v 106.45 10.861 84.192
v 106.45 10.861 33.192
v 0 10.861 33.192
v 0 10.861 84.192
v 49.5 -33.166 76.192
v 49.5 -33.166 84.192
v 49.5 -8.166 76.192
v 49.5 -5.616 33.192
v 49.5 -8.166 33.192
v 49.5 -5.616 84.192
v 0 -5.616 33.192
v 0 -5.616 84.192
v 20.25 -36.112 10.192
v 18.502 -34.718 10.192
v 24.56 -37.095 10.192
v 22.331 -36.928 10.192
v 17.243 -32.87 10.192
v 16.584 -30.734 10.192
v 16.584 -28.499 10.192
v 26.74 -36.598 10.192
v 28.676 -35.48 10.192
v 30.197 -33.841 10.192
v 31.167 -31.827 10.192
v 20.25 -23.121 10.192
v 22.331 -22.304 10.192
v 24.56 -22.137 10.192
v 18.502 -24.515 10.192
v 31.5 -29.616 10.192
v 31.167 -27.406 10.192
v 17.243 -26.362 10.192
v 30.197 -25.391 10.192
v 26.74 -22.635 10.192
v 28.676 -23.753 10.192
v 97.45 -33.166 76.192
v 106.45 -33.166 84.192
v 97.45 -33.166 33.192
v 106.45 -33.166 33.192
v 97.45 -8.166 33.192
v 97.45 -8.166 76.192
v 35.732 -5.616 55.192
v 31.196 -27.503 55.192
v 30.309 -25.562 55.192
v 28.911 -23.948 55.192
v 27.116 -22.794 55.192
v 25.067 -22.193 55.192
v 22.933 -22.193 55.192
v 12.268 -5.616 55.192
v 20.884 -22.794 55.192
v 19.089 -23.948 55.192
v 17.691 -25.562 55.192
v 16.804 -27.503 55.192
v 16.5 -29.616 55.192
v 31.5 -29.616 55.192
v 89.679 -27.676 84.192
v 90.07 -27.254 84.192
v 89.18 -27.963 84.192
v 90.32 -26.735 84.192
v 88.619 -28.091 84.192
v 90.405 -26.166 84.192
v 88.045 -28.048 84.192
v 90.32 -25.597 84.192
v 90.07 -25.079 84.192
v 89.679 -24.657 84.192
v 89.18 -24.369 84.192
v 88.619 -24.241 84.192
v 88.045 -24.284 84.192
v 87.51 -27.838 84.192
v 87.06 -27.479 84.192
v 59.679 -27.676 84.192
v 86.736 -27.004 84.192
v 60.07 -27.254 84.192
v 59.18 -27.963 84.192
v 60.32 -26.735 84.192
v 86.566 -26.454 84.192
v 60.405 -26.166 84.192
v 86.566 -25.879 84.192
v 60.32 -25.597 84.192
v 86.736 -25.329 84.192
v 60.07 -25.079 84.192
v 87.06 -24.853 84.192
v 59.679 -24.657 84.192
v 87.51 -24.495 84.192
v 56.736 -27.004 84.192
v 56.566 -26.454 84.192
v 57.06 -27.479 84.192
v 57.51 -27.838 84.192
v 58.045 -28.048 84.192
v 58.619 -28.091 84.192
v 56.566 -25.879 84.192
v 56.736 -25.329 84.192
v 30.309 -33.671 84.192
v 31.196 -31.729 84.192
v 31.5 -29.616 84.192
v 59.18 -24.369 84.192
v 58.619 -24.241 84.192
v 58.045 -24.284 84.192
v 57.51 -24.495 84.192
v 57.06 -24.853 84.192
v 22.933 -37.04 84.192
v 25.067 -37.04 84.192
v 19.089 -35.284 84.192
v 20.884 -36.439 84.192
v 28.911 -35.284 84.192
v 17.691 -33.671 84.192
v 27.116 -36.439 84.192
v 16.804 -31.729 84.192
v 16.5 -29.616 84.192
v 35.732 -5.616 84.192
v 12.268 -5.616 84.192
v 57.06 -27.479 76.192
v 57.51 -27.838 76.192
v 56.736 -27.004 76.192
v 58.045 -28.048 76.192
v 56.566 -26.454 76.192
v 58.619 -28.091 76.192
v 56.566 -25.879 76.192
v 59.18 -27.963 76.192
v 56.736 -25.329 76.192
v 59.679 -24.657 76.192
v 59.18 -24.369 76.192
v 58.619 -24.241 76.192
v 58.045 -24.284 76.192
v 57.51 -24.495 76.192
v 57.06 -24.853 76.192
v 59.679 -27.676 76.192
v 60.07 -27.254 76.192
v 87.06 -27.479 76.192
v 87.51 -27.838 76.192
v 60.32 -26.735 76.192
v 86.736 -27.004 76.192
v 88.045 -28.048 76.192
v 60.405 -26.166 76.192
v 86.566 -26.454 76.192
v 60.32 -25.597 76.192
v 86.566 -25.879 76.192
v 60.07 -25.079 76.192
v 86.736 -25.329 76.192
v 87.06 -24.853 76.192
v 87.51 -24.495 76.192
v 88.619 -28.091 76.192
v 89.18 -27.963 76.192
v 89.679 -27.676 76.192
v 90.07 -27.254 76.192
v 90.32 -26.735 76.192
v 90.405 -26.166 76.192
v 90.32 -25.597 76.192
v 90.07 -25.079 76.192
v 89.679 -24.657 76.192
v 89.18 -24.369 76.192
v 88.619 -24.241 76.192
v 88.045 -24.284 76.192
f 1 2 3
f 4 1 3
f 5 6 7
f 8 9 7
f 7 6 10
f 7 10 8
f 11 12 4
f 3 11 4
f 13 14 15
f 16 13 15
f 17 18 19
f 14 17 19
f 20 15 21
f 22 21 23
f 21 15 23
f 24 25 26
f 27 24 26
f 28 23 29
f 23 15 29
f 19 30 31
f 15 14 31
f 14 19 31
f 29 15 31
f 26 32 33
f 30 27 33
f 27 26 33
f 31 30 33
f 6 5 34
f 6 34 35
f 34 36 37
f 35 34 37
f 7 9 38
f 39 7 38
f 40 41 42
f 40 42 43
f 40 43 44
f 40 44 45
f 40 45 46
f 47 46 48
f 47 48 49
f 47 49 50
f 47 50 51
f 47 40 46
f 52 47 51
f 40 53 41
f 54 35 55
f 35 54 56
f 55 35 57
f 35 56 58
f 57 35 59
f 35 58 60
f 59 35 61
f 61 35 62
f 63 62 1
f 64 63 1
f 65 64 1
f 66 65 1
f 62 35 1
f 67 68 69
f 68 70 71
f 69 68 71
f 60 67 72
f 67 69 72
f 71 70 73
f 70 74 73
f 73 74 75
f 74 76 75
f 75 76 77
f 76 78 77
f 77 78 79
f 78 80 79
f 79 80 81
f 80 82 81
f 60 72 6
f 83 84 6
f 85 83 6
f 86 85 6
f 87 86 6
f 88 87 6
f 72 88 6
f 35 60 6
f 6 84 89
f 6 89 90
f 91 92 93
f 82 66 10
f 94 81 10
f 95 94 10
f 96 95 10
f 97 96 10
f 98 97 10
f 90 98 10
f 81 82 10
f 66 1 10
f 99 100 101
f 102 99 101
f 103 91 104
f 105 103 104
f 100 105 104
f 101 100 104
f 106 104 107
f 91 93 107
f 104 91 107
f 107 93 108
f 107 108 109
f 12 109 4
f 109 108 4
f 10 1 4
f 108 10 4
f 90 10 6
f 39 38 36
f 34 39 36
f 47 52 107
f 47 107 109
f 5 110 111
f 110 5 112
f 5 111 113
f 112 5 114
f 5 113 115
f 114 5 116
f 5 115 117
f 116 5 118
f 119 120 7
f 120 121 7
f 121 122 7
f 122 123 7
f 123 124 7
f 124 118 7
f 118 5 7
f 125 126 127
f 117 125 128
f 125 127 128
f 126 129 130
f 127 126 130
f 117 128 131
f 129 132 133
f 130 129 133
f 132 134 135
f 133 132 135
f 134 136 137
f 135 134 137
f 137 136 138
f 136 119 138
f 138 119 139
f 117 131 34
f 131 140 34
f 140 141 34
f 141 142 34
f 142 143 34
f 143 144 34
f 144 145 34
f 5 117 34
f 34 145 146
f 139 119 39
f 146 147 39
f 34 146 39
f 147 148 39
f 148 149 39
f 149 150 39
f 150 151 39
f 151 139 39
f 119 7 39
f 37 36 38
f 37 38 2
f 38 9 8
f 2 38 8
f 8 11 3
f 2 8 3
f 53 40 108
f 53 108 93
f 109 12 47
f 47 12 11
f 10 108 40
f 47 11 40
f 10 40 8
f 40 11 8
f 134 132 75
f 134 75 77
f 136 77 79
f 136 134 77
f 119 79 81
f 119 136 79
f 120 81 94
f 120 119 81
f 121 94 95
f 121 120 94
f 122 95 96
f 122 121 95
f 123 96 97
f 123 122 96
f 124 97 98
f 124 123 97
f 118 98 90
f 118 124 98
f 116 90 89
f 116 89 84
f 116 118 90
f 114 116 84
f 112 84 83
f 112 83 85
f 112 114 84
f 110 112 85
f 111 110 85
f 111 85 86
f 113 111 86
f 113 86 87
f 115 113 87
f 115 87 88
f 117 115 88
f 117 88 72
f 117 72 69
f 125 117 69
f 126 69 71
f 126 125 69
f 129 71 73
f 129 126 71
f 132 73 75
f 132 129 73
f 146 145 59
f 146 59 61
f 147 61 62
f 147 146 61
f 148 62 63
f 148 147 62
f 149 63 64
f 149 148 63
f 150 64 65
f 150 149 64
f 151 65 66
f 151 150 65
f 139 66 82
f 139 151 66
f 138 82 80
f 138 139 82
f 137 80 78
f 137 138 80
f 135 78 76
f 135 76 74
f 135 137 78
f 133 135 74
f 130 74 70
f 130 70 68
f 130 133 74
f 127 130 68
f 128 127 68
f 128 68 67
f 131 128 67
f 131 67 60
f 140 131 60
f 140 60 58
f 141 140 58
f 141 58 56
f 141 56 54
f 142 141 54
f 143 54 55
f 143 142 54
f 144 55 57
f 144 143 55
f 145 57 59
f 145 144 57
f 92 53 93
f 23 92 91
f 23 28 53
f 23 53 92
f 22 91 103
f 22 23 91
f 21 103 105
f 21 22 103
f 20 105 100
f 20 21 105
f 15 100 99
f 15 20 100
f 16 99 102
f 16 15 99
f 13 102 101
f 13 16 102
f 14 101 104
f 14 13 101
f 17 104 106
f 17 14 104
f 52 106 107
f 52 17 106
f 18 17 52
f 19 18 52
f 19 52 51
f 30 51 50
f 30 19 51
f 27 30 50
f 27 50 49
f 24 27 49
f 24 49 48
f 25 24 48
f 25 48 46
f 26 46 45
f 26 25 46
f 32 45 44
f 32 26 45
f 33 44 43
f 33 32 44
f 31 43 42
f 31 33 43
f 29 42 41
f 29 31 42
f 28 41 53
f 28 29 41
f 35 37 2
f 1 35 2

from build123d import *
from build123d.topology import SkipClean

# Parameters (mm, degrees)
SKETCH1_W             = 48
SKETCH1_H             = 53
BOSS_EXTRUDE1_DEPTH   = 10
SKETCH2_W             = 48
SKETCH2_H             = 5.616325
BOSS_EXTRUDE2_DEPTH   = 33.1917878
SKETCH4_W             = 4
SKETCH4_H             = 10
BOSS_EXTRUDE4_DEPTH   = 40
SKETCH5_W             = 48
SKETCH5_H             = 10.8609375
BOSS_EXTRUDE5_DEPTH   = 23.1917878
SKETCH6_W             = 48
SKETCH6_H             = 5
BOSS_EXTRUDE6_DEPTH   = 42.3
SKETCH7_W             = 12.8082122
SKETCH7_H             = 16.4772625
BOSS_EXTRUDE7_DEPTH   = 48
CUT_EXTRUDE1_REACH    = 84.426
SKETCH8_R             = 11.5
SKETCH8_R_2           = 2
FILLET1_R             = 10
FILLET2_R             = 4
SKETCH9_W             = 5
SKETCH9_H             = 16.4772625
BOSS_EXTRUDE9_DEPTH   = 48
CUT_EXTRUDE2_DEPTH    = 88.252507127
SKETCH11_W            = 51
SKETCH11_H            = 16.4772625
BOSS_EXTRUDE10_DEPTH  = 49.45
BOSS_EXTRUDE11_DEPTH  = 46
SKETCH16_W            = 47.95
SKETCH16_H            = 51
BOSS_EXTRUDE14_DEPTH  = 2.55
SKETCH14_W            = 5
SKETCH14_H            = 42.3
BOSS_EXTRUDE13_DEPTH  = 1.5
SKETCH17_W            = 51
SKETCH17_H            = 19.0272625
BOSS_EXTRUDE15_DEPTH  = 9
BOSS_EXTRUDE16_DEPTH  = 25
SKETCH19_R            = 1.9304
CUT_EXTRUDE3_DEPTH    = 125.404890183
MIRROR2_START         = 33.1917878
MIRROR2_DEPTH         = 51
MIRROR2_START_2       = 76.1917878
MIRROR2_2_OUTLINE_W   = 47.95
MIRROR2_2_OUTLINE_H   = 25
MIRROR2_2_OUTLINE_R   = 1.9304
MIRROR2_2_DEPTH       = 8
MIRROR2_3_OUTLINE_W   = 45
MIRROR2_3_OUTLINE_H   = 42.3
MIRROR2_3_OUTLINE_R   = 2
MIRROR2_3_OUTLINE_R_2 = 11.5
MIRROR2_3_DEPTH       = 5
SKETCH20_W            = 103.287975037
SKETCH20_H            = 97.84889924
CUT_EXTRUDE4_DEPTH    = 144.929961559
SKETCH21_W            = 49.5
SKETCH21_H            = 42.3
CUT_EXTRUDE5_DEPTH    = 128.391431036
SKETCH24_R            = 7.5
BOSS_EXTRUDE18_DEPTH  = 45
BOSS_EXTRUDE19_DEPTH  = 29


# Read off the part's stored shape, not the designer's step: Mirror2
with BuildPart() as part:
    # Sketch1 → Boss-Extrude1 (new body)
    with BuildSketch(Plane.XY):
        with Locations((24, 26.5)):
            Rectangle(SKETCH1_W, SKETCH1_H)
    extrude(amount=BOSS_EXTRUDE1_DEPTH)

    # Sketch2 → Boss-Extrude2 (add)
    with BuildSketch(Plane(origin=(0, 0, 0), x_dir=(-1, 0, 0), z_dir=(0, 0, -1))):
        with Locations((-24, -2.8081625)):
            Rectangle(SKETCH2_W, SKETCH2_H)
    extrude(amount=-BOSS_EXTRUDE2_DEPTH)

    # Sketch4 → Boss-Extrude4 (add)
    with BuildSketch(Plane.XY.offset(10)):
        with Locations((2, 48)):
            Rectangle(SKETCH4_W, SKETCH4_H)
        with Locations((46, 48)):
            Rectangle(SKETCH4_W, SKETCH4_H)
    extrude(amount=BOSS_EXTRUDE4_DEPTH)

    # Sketch5 → Boss-Extrude5 (add)
    with BuildSketch(Plane.XY.offset(10)):
        with Locations((24, 5.43046875)):
            Rectangle(SKETCH5_W, SKETCH5_H)
    extrude(amount=BOSS_EXTRUDE5_DEPTH)

    # Sketch6 → Boss-Extrude6 (add)
    with BuildSketch(Plane.XZ.offset(5.616325)):
        with Locations((24, 30.6917878)):
            Rectangle(SKETCH6_W, SKETCH6_H)
    extrude(amount=BOSS_EXTRUDE6_DEPTH)

    # Sketch7 → Boss-Extrude7 (add)
    with BuildSketch(Plane.ZY):
        with Locations((-6.4041061, 2.62230625)):
            Rectangle(SKETCH7_W, SKETCH7_H)
    extrude(amount=-BOSS_EXTRUDE7_DEPTH)

    # Sketch8 → Cut-Extrude1 (cut, up to next)
    with BuildSketch(Plane(origin=(0, 0, 28.1917878), x_dir=(-1, 0, 0), z_dir=(0, 0, -1)), mode=Mode.PRIVATE) as cut_extrude1_sk1:
        with Locations((-24, -26.616325)):
            Circle(SKETCH8_R)
    cut_extrude1_tool1 = extrude(cut_extrude1_sk1.sketch, amount=-CUT_EXTRUDE1_REACH, mode=Mode.PRIVATE) & part.part
    # Sketch8 → Cut-Extrude1 (cut, up to next)
    with BuildSketch(Plane(origin=(0, 0, 28.1917878), x_dir=(-1, 0, 0), z_dir=(0, 0, -1)), mode=Mode.PRIVATE) as cut_extrude1_sk2:
        with Locations((-39.5, -11.116325)):
            Circle(SKETCH8_R_2)
    cut_extrude1_tool2 = extrude(cut_extrude1_sk2.sketch, amount=-CUT_EXTRUDE1_REACH, mode=Mode.PRIVATE) & part.part
    # Sketch8 → Cut-Extrude1 (cut, up to next)
    with BuildSketch(Plane(origin=(0, 0, 28.1917878), x_dir=(-1, 0, 0), z_dir=(0, 0, -1)), mode=Mode.PRIVATE) as cut_extrude1_sk3:
        with Locations((-39.5, -42.116325)):
            Circle(SKETCH8_R_2)
    cut_extrude1_tool3 = extrude(cut_extrude1_sk3.sketch, amount=-CUT_EXTRUDE1_REACH, mode=Mode.PRIVATE) & part.part
    # Sketch8 → Cut-Extrude1 (cut, up to next)
    with BuildSketch(Plane(origin=(0, 0, 28.1917878), x_dir=(-1, 0, 0), z_dir=(0, 0, -1)), mode=Mode.PRIVATE) as cut_extrude1_sk4:
        with Locations((-8.5, -11.116325)):
            Circle(SKETCH8_R_2)
    cut_extrude1_tool4 = extrude(cut_extrude1_sk4.sketch, amount=-CUT_EXTRUDE1_REACH, mode=Mode.PRIVATE) & part.part
    # Sketch8 → Cut-Extrude1 (cut, up to next)
    with BuildSketch(Plane(origin=(0, 0, 28.1917878), x_dir=(-1, 0, 0), z_dir=(0, 0, -1)), mode=Mode.PRIVATE) as cut_extrude1_sk5:
        with Locations((-8.5, -42.116325)):
            Circle(SKETCH8_R_2)
    cut_extrude1_tool5 = extrude(cut_extrude1_sk5.sketch, amount=-CUT_EXTRUDE1_REACH, mode=Mode.PRIVATE) & part.part
    add(cut_extrude1_tool1.solids().sort_by_distance((24, -26.616325, 28.191788))[0], mode=Mode.SUBTRACT)
    add(cut_extrude1_tool2.solids().sort_by_distance((39.5, -11.116325, 28.191788))[0], mode=Mode.SUBTRACT)
    add(cut_extrude1_tool3.solids().sort_by_distance((39.5, -42.116325, 28.191788))[0], mode=Mode.SUBTRACT)
    add(cut_extrude1_tool4.solids().sort_by_distance((8.5, -11.116325, 28.191788))[0], mode=Mode.SUBTRACT)
    add(cut_extrude1_tool5.solids().sort_by_distance((8.5, -42.116325, 28.191788))[0], mode=Mode.SUBTRACT)

    # Fillet1
    fillet1_edges = [part.edges().sort_by_distance(p)[0] for p in [
        (24, 10.8609375, 0),
    ]]
    fillet(fillet1_edges, radius=FILLET1_R)

    # Fillet2
    fillet2_edges = [part.edges().sort_by_distance(p)[0] for p in [
        (2, 43, 10),
        (46, 43, 10),
    ]]
    fillet(fillet2_edges, radius=FILLET2_R)

    # Sketch9 → Boss-Extrude9 (add)
    with BuildSketch(Plane(origin=(48, 0, 0), x_dir=(0, 0, -1), z_dir=(1, 0, 0))):
        with Locations((15.3082122, 2.62230625)):
            Rectangle(SKETCH9_W, SKETCH9_H)
    extrude(amount=-BOSS_EXTRUDE9_DEPTH)

    # Sketch10 → Cut-Extrude2 (cut, through all)
    with BuildSketch(Plane(origin=(48, 0, 0), x_dir=(0, 0, -1), z_dir=(1, 0, 0))):
        Polygon((17.8082122, 10.8609375), (-33.1917878, 10.8609375), (-76.887145623, 43.902095521), (-50.794096938, 74.436514195), (27.207463492, 71.105486703), align=None)
    extrude(amount=-CUT_EXTRUDE2_DEPTH, mode=Mode.SUBTRACT)

    # Sketch11 → Boss-Extrude10 (add)
    with BuildSketch(Plane(origin=(48, 0, 0), x_dir=(0, 0, -1), z_dir=(1, 0, 0))):
        with Locations((-7.6917878, 2.62230625)):
            Rectangle(SKETCH11_W, SKETCH11_H)
    extrude(amount=BOSS_EXTRUDE10_DEPTH)

    # Sketch12 → Boss-Extrude11 (add)
    with BuildSketch(Plane(origin=(0, 0, 28.1917878), x_dir=(-1, 0, 0), z_dir=(0, 0, -1))):
        Polygon((-48, -47.916325), (-45, -47.916325), (-45, -5.616325), (-49.5, -5.616325), (-49.5, -47.916325), align=None)
    extrude(amount=BOSS_EXTRUDE11_DEPTH)

    # Sketch16 → Boss-Extrude14 (add)
    with BuildSketch(Plane.XZ.offset(5.616325)):
        with Locations((73.475, 7.6917878)):
            Rectangle(SKETCH16_W, SKETCH16_H)
    extrude(amount=BOSS_EXTRUDE14_DEPTH)

    # Sketch14 → Boss-Extrude13 (add)
    with BuildSketch(Plane(origin=(49.5, 0, 0), x_dir=(0, 0, -1), z_dir=(1, 0, 0))):
        with Locations((-30.6917878, -26.766325)):
            Rectangle(SKETCH14_W, SKETCH14_H)
    extrude(amount=-BOSS_EXTRUDE13_DEPTH)

    # Sketch17 → Boss-Extrude15 (add)
    with BuildSketch(Plane(origin=(97.45, 0, 0), x_dir=(0, 0, -1), z_dir=(1, 0, 0))):
        with Locations((-7.6917878, 1.34730625)):
            Rectangle(SKETCH17_W, SKETCH17_H)
    extrude(amount=BOSS_EXTRUDE15_DEPTH)

    # Sketch18 → Boss-Extrude16 (add)
    with BuildSketch(Plane.XZ.offset(8.166325)):
        Polygon((49.5, -17.8082122), (106.45, -17.8082122), (106.45, -9.8082122), (106.45, 33.1917878), (97.45, 33.1917878), (97.45, -9.8082122), (49.5, -9.8082122), align=None)
    extrude(amount=BOSS_EXTRUDE16_DEPTH)

    # Sketch19 → Cut-Extrude3 (cut, through all)
    with BuildSketch(Plane.XY.offset(-9.8082122)):
        with Locations((58.475, -26.166325)):
            Circle(SKETCH19_R)
        with Locations((88.475, -26.166325)):
            Circle(SKETCH19_R)
    extrude(amount=-CUT_EXTRUDE3_DEPTH, mode=Mode.SUBTRACT)

    # Mirror2 outline → Mirror2 (add)
    with BuildSketch(Plane.XY.offset(MIRROR2_START)):
        Polygon((49.5, -47.916325), (49.5, -8.166325), (97.45, -8.166325), (97.45, -33.166325), (106.45, -33.166325), (106.45, 10.8609375), (0, 10.8609375), (0, -5.616325), (45, -5.616325), (45, -47.916325), align=None)
    extrude(amount=MIRROR2_DEPTH)

    # Mirror2 2 outline → Mirror2 2 (add)
    with BuildSketch(Plane.XY.offset(MIRROR2_START_2)):
        with Locations((73.475, -20.666325)):
            Rectangle(MIRROR2_2_OUTLINE_W, MIRROR2_2_OUTLINE_H)
        with Locations((58.475, -26.166325)):
            Circle(MIRROR2_2_OUTLINE_R, mode=Mode.SUBTRACT)
        with Locations((88.475, -26.166325)):
            Circle(MIRROR2_2_OUTLINE_R, mode=Mode.SUBTRACT)
    extrude(amount=MIRROR2_2_DEPTH)

    # Mirror2 3 outline → Mirror2 3 (add)
    with SkipClean():  # the faces are left unmerged after this step: merging them gives an invalid solid
        with BuildSketch(Plane.XY.offset(MIRROR2_START)):
            with Locations((22.5, -26.766325)):
                Rectangle(MIRROR2_3_OUTLINE_W, MIRROR2_3_OUTLINE_H)
            with Locations((8.5, -42.116325)):
                Circle(MIRROR2_3_OUTLINE_R, mode=Mode.SUBTRACT)
            with Locations((39.5, -42.116325)):
                Circle(MIRROR2_3_OUTLINE_R, mode=Mode.SUBTRACT)
            with Locations((24, -26.616325)):
                Circle(MIRROR2_3_OUTLINE_R_2, mode=Mode.SUBTRACT)
            with Locations((8.5, -11.116325)):
                Circle(MIRROR2_3_OUTLINE_R, mode=Mode.SUBTRACT)
            with Locations((39.5, -11.116325)):
                Circle(MIRROR2_3_OUTLINE_R, mode=Mode.SUBTRACT)
        extrude(amount=MIRROR2_3_DEPTH)

    # Sketch20 → Cut-Extrude4 (cut, through all)
    with BuildSketch(Plane.ZY):
        with Locations((-18.452199719, -38.06351212)):
            Rectangle(SKETCH20_W, SKETCH20_H)
    extrude(amount=-CUT_EXTRUDE4_DEPTH, mode=Mode.SUBTRACT)

    # Sketch21 → Cut-Extrude5 (cut, through all)
    with BuildSketch(Plane.XY.offset(84.1917878)):
        with Locations((24.75, -26.766325)):
            Rectangle(SKETCH21_W, SKETCH21_H)
    extrude(amount=-CUT_EXTRUDE5_DEPTH, mode=Mode.SUBTRACT)



with BuildPart() as body_2:
    # Sketch24 → Boss-Extrude18 (new body)
    with BuildSketch(Plane.XY.offset(55.1917878)):
        with Locations((24, -29.616325)):
            Circle(SKETCH24_R)
    extrude(amount=-BOSS_EXTRUDE18_DEPTH)


with BuildPart() as part_1:
    add(part.part)

    add(body_2.part)  # Boss-Extrude19 merges body 2
    # Sketch25 → Boss-Extrude19 (add)
    with BuildSketch(Plane.XY.offset(55.1917878)):
        with BuildLine():
            Line((16.5, -29.616325), (12.268152463, -5.616325))
            Line((12.268152463, -5.616325), (35.731847537, -5.616325))
            Line((35.731847537, -5.616325), (31.5, -29.616325))
            ThreePointArc((31.5, -29.616325), (24, -37.116325), (16.5, -29.616325))
        make_face()
    extrude(amount=BOSS_EXTRUDE19_DEPTH)


solid = part_1.part
